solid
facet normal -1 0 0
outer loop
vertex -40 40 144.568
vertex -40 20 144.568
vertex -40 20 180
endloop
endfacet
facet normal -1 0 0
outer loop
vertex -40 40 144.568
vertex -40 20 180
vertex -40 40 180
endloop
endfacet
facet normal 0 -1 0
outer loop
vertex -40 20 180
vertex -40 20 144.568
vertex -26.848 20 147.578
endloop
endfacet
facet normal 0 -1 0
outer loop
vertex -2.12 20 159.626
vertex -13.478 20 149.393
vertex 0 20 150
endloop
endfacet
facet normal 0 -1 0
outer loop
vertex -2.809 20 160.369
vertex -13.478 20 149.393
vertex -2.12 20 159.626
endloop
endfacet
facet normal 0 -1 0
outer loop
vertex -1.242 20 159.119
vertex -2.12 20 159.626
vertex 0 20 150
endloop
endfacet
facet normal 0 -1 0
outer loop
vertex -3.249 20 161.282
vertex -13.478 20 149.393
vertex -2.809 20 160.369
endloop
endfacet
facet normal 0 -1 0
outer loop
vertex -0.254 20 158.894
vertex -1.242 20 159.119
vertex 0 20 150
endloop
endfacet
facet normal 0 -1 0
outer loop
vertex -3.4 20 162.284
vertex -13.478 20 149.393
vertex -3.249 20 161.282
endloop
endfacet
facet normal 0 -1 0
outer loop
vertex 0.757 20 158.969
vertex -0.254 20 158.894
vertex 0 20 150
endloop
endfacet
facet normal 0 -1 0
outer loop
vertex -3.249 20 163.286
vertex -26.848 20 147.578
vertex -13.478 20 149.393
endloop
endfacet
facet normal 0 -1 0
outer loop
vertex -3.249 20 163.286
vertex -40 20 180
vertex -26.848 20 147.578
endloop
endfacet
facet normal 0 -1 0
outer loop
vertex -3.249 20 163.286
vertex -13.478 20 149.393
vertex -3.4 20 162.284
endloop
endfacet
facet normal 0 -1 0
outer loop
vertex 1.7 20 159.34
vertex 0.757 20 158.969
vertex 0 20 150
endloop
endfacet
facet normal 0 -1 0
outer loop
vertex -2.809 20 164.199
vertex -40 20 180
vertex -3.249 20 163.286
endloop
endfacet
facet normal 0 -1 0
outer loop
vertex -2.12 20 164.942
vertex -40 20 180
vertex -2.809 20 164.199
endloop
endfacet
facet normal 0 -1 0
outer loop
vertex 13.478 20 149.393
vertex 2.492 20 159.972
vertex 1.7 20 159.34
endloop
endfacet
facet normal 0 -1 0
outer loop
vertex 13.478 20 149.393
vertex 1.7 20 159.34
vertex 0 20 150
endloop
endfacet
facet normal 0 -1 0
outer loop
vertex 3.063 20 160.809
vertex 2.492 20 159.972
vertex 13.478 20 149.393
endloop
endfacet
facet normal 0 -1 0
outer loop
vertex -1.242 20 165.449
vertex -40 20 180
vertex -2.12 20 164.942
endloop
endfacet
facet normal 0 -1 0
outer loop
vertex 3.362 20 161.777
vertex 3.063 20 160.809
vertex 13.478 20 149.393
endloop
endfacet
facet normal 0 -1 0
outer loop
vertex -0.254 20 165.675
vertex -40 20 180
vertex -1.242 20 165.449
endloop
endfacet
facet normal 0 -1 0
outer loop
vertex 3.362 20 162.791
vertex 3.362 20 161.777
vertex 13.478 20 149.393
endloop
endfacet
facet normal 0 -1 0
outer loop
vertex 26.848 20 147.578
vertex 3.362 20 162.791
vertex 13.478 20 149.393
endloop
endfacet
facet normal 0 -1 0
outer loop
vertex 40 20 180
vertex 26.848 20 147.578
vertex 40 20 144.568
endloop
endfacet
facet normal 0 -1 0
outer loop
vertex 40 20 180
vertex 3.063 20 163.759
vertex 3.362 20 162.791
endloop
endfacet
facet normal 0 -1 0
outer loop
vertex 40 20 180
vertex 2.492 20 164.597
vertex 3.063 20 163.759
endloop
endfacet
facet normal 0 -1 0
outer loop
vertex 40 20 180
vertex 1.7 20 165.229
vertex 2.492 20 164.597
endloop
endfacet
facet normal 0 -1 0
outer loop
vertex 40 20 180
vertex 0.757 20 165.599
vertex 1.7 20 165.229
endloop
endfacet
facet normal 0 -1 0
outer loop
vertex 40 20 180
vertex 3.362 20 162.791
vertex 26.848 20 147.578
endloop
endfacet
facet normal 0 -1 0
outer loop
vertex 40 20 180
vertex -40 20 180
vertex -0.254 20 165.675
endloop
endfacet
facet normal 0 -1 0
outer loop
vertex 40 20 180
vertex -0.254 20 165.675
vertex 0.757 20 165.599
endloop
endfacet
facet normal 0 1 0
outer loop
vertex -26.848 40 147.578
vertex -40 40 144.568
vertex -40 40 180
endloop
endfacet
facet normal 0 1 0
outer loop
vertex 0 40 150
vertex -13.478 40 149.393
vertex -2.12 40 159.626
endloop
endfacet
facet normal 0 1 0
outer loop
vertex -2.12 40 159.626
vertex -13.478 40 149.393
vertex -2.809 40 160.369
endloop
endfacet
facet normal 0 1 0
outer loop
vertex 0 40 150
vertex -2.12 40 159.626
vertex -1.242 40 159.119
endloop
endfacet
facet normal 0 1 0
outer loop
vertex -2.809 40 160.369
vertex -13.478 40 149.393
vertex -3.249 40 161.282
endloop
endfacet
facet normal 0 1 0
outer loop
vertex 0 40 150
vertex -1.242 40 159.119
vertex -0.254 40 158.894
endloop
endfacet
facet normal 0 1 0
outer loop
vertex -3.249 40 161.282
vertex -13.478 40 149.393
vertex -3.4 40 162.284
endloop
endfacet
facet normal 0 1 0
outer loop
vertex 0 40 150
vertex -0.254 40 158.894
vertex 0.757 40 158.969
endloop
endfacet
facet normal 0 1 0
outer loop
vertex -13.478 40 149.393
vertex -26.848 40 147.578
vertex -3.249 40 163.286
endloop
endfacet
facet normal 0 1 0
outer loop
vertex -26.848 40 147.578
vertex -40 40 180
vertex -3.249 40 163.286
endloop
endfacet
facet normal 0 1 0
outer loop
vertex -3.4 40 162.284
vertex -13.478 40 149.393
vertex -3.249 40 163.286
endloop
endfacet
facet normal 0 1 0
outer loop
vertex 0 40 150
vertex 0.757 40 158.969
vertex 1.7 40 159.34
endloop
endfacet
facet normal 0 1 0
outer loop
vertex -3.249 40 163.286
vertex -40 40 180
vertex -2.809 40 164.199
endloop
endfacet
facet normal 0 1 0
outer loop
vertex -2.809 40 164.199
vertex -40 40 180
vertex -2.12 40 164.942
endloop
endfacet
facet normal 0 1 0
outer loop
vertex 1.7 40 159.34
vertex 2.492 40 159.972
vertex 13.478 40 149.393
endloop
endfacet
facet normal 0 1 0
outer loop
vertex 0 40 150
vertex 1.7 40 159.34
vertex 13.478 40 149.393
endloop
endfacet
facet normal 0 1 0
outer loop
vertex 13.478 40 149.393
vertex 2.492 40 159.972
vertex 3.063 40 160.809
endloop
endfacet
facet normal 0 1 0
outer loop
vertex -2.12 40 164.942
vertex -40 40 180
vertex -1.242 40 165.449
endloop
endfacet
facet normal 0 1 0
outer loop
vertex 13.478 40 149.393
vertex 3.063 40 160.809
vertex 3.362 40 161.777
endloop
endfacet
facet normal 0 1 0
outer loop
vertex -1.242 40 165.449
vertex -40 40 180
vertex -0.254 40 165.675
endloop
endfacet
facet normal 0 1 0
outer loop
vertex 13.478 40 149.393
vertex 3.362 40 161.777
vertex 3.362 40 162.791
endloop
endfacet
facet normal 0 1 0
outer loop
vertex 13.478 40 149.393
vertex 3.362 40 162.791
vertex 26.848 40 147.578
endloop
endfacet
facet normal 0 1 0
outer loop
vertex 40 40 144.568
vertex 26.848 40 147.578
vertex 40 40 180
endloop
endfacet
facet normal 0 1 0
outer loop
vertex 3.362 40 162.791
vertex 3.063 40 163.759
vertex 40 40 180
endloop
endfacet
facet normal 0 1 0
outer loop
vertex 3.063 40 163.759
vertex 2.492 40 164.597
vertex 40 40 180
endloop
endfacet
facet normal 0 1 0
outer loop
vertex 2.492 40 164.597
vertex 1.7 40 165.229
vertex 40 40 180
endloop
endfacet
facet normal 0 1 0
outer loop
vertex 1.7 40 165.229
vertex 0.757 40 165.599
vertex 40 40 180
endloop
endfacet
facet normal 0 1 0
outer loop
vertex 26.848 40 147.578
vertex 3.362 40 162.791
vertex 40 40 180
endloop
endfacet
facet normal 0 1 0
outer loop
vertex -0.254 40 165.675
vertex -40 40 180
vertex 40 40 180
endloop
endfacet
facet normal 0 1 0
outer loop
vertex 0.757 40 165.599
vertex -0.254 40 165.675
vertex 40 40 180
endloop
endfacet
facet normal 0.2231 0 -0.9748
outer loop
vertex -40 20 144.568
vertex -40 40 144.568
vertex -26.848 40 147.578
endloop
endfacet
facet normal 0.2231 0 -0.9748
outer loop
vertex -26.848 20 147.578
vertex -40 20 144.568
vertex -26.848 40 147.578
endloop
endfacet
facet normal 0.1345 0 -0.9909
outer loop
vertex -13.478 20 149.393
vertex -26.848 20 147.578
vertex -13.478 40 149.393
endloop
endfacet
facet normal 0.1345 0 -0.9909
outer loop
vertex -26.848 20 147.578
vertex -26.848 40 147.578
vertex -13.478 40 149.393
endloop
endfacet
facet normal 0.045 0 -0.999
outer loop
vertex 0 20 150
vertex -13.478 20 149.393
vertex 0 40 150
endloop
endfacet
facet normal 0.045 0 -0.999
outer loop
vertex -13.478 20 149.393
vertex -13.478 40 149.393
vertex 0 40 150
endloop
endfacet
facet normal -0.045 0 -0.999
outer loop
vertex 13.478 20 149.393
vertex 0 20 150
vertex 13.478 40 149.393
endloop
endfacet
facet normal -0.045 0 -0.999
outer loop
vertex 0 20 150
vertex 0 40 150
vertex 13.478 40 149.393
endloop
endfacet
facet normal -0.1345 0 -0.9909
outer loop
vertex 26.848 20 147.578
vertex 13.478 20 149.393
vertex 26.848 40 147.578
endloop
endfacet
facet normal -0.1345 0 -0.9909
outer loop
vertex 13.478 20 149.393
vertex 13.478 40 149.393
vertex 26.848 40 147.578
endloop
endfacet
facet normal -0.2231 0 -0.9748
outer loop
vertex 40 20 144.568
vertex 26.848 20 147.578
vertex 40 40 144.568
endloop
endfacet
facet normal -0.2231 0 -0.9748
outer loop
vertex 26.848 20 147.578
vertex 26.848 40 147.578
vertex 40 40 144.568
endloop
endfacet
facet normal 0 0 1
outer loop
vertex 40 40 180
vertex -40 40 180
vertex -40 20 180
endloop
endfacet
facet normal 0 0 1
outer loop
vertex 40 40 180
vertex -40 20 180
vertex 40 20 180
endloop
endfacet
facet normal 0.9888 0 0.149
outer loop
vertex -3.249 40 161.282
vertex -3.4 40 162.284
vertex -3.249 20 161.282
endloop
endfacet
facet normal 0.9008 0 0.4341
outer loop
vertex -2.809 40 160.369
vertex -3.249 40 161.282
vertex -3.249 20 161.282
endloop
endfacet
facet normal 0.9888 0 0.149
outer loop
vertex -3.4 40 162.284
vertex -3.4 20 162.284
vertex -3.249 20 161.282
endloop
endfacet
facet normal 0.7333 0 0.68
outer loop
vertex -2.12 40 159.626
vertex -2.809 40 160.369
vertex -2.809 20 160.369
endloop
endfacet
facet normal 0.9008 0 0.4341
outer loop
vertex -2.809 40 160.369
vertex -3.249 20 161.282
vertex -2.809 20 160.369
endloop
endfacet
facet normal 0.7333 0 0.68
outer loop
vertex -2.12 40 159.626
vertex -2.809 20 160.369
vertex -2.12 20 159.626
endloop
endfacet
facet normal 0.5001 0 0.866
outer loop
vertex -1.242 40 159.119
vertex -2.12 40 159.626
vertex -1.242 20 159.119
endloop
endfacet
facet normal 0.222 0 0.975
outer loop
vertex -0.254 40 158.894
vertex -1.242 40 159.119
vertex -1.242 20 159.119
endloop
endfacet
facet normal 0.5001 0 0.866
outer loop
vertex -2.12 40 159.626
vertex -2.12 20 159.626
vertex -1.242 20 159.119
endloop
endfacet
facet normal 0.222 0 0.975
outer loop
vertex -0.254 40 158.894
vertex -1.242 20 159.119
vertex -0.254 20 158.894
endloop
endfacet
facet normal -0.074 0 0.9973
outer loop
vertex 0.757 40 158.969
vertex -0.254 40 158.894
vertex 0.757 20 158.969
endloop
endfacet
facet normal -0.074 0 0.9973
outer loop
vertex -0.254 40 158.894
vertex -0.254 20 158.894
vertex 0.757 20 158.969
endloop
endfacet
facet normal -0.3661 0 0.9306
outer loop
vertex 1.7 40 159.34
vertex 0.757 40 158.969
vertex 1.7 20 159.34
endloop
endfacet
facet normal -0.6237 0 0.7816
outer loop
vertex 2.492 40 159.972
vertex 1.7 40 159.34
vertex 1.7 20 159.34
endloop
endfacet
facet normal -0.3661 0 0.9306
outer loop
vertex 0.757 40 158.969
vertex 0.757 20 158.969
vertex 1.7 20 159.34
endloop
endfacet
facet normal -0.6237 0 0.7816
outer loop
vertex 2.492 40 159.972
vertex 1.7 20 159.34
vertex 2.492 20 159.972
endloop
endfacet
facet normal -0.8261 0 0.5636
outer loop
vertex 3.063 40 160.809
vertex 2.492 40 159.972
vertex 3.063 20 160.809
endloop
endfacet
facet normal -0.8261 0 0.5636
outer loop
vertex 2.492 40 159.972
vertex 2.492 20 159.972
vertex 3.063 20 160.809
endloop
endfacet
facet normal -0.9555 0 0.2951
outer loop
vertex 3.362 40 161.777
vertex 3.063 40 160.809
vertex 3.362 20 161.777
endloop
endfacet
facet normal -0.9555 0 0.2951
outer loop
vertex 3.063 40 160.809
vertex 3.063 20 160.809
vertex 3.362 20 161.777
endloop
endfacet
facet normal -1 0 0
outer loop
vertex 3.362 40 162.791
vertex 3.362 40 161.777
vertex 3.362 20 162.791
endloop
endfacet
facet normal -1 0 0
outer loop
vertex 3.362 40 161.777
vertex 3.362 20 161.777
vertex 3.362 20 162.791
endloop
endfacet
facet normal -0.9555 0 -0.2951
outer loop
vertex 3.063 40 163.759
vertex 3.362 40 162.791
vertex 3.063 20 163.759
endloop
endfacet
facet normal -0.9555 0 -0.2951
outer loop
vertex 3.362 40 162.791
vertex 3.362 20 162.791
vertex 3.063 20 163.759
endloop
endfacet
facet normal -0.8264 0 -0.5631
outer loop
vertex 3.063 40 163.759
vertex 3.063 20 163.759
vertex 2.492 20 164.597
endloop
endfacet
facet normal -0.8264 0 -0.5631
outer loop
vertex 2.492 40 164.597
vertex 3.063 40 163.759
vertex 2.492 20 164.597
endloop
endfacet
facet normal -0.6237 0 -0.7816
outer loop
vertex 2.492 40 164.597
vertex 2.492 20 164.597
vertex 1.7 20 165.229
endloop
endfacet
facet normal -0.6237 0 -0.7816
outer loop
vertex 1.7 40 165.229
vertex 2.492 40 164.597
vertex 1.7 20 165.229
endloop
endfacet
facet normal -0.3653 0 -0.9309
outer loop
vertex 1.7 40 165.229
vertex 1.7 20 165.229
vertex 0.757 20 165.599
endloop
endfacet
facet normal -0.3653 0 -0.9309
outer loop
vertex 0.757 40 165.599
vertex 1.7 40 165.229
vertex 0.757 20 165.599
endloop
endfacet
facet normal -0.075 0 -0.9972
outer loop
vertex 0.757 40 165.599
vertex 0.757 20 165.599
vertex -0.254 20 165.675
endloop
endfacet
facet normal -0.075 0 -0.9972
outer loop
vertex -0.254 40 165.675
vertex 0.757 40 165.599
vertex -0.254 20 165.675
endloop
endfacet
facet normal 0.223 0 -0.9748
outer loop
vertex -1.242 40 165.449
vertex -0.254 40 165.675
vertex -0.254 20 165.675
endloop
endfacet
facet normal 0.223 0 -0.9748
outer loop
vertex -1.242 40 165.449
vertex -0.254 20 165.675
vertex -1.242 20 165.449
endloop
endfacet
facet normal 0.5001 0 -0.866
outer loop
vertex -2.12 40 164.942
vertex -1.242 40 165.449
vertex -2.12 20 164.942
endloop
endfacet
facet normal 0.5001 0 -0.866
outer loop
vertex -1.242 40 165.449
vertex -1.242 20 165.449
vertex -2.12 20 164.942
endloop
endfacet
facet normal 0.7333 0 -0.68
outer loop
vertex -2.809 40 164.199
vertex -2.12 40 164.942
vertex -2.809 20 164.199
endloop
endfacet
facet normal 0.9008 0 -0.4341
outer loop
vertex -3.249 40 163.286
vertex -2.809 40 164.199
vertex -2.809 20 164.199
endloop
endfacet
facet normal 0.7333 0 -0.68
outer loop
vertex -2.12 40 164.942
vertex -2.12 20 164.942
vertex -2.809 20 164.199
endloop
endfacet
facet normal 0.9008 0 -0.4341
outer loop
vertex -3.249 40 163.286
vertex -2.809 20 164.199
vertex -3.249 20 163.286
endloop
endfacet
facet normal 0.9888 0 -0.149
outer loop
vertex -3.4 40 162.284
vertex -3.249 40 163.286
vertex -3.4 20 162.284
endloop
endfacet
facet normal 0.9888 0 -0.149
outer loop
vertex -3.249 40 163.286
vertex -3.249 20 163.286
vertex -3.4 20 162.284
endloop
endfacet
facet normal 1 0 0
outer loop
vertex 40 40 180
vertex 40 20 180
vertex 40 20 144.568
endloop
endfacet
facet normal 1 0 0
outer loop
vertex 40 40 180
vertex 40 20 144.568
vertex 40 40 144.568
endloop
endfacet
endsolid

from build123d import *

# Parameters (mm, degrees)
IZIM1_W                          = 150
IZIM1_H                          = 70
Y_KSEKLIK_EKSTR_ZYON1_REACH      = 371.188
Y_KSEKLIK_EKSTR_ZYON1_END_RADIUS = 150
IZIM2_W                          = 79.999999942
IZIM2_H                          = 40
DELIK1_D                         = 260
F_6_8_6_8_AP_DELIK1_D            = 6.8
F_6_8_6_8_AP_DELIK1_DEPTH        = 40
IZIM10_R                         = 150
IZIM10_R_2                       = 130
KES_EKSTR_ZYON2_DEPTH            = 70
KES_EKSTR_ZYON3_START            = -20
KES_EKSTR_ZYON3_DEPTH            = 20


with BuildPart() as part:
    # Çizim1 → Döndür1 (revolve)
    with BuildSketch(Plane.XY, mode=Mode.PRIVATE) as d_nd_r1_sk:
        with Locations((75, 35)):
            Rectangle(IZIM1_W, IZIM1_H)
    revolve(d_nd_r1_sk.sketch.rotate(Axis((0, 70, 0), (0, -1, 0)), 270), axis=Axis((0, 70, 0), (0, -1, 0)))

    # Yükseklik-Ekstrüzyon1: up to this cylinder (the profile starts outside it)
    y_kseklik_ekstr_zyon1_end = Plane(origin=(0, 20, 0), z_dir=(0, -1, 0)) * Cylinder(Y_KSEKLIK_EKSTR_ZYON1_END_RADIUS, 1043.376, mode=Mode.PRIVATE)
    # Çizim2 → Yükseklik-Ekstrüzyon1 (add, up to the surface)
    with BuildSketch(Plane.XY.offset(180), mode=Mode.PRIVATE) as y_kseklik_ekstr_zyon1_sk1:
        with Locations((1e-08, 20)):
            Rectangle(IZIM2_W, IZIM2_H)
    y_kseklik_ekstr_zyon1_tool1 = extrude(y_kseklik_ekstr_zyon1_sk1.sketch, amount=-Y_KSEKLIK_EKSTR_ZYON1_REACH, mode=Mode.PRIVATE) - y_kseklik_ekstr_zyon1_end
    add(y_kseklik_ekstr_zyon1_tool1.solids().sort_by_distance((0, 20, 180))[0])

    # Delik1 (through all)
    with Locations(Plane(origin=(0, 70, 0), x_dir=(1, 0, 0), z_dir=(0, 1, 0))):
        with Locations((0, 0)):
            Hole(DELIK1_D / 2)

    # Ø6.8 (6.8) Çap Delik1
    with Locations(Plane(origin=(0, 40, 0), x_dir=(1, 0, 0), z_dir=(0, 1, 0))):
        with Locations((0, -162.284161474), (0, 162.284161474)):
            Hole(F_6_8_6_8_AP_DELIK1_D / 2, depth=F_6_8_6_8_AP_DELIK1_DEPTH)

    # Çizim10 → Kes-Ekstrüzyon2 (cut)
    with BuildSketch(Plane(origin=(0, 70, 0), x_dir=(1, 0, 0), z_dir=(0, 1, 0))):
        Circle(IZIM10_R)
        Circle(IZIM10_R_2, mode=Mode.SUBTRACT)
    extrude(amount=-KES_EKSTR_ZYON2_DEPTH, mode=Mode.SUBTRACT)

    # Çizim11 → Kes-Ekstrüzyon3 (cut)
    with BuildSketch(Plane.XZ.offset(KES_EKSTR_ZYON3_START)):
        with BuildLine():
            Line((39.999999981, 144.568322953), (39.999999981, 180))
            Line((39.999999981, 180), (-39.999999961, 180))
            Line((-39.999999961, 180), (-39.999999961, 144.568322959))
            ThreePointArc((-39.999999961, 144.568322959), (1e-08, 150), (39.999999981, 144.568322953))
        make_face()
    extrude(amount=KES_EKSTR_ZYON3_DEPTH, mode=Mode.SUBTRACT)


solid = part.part
